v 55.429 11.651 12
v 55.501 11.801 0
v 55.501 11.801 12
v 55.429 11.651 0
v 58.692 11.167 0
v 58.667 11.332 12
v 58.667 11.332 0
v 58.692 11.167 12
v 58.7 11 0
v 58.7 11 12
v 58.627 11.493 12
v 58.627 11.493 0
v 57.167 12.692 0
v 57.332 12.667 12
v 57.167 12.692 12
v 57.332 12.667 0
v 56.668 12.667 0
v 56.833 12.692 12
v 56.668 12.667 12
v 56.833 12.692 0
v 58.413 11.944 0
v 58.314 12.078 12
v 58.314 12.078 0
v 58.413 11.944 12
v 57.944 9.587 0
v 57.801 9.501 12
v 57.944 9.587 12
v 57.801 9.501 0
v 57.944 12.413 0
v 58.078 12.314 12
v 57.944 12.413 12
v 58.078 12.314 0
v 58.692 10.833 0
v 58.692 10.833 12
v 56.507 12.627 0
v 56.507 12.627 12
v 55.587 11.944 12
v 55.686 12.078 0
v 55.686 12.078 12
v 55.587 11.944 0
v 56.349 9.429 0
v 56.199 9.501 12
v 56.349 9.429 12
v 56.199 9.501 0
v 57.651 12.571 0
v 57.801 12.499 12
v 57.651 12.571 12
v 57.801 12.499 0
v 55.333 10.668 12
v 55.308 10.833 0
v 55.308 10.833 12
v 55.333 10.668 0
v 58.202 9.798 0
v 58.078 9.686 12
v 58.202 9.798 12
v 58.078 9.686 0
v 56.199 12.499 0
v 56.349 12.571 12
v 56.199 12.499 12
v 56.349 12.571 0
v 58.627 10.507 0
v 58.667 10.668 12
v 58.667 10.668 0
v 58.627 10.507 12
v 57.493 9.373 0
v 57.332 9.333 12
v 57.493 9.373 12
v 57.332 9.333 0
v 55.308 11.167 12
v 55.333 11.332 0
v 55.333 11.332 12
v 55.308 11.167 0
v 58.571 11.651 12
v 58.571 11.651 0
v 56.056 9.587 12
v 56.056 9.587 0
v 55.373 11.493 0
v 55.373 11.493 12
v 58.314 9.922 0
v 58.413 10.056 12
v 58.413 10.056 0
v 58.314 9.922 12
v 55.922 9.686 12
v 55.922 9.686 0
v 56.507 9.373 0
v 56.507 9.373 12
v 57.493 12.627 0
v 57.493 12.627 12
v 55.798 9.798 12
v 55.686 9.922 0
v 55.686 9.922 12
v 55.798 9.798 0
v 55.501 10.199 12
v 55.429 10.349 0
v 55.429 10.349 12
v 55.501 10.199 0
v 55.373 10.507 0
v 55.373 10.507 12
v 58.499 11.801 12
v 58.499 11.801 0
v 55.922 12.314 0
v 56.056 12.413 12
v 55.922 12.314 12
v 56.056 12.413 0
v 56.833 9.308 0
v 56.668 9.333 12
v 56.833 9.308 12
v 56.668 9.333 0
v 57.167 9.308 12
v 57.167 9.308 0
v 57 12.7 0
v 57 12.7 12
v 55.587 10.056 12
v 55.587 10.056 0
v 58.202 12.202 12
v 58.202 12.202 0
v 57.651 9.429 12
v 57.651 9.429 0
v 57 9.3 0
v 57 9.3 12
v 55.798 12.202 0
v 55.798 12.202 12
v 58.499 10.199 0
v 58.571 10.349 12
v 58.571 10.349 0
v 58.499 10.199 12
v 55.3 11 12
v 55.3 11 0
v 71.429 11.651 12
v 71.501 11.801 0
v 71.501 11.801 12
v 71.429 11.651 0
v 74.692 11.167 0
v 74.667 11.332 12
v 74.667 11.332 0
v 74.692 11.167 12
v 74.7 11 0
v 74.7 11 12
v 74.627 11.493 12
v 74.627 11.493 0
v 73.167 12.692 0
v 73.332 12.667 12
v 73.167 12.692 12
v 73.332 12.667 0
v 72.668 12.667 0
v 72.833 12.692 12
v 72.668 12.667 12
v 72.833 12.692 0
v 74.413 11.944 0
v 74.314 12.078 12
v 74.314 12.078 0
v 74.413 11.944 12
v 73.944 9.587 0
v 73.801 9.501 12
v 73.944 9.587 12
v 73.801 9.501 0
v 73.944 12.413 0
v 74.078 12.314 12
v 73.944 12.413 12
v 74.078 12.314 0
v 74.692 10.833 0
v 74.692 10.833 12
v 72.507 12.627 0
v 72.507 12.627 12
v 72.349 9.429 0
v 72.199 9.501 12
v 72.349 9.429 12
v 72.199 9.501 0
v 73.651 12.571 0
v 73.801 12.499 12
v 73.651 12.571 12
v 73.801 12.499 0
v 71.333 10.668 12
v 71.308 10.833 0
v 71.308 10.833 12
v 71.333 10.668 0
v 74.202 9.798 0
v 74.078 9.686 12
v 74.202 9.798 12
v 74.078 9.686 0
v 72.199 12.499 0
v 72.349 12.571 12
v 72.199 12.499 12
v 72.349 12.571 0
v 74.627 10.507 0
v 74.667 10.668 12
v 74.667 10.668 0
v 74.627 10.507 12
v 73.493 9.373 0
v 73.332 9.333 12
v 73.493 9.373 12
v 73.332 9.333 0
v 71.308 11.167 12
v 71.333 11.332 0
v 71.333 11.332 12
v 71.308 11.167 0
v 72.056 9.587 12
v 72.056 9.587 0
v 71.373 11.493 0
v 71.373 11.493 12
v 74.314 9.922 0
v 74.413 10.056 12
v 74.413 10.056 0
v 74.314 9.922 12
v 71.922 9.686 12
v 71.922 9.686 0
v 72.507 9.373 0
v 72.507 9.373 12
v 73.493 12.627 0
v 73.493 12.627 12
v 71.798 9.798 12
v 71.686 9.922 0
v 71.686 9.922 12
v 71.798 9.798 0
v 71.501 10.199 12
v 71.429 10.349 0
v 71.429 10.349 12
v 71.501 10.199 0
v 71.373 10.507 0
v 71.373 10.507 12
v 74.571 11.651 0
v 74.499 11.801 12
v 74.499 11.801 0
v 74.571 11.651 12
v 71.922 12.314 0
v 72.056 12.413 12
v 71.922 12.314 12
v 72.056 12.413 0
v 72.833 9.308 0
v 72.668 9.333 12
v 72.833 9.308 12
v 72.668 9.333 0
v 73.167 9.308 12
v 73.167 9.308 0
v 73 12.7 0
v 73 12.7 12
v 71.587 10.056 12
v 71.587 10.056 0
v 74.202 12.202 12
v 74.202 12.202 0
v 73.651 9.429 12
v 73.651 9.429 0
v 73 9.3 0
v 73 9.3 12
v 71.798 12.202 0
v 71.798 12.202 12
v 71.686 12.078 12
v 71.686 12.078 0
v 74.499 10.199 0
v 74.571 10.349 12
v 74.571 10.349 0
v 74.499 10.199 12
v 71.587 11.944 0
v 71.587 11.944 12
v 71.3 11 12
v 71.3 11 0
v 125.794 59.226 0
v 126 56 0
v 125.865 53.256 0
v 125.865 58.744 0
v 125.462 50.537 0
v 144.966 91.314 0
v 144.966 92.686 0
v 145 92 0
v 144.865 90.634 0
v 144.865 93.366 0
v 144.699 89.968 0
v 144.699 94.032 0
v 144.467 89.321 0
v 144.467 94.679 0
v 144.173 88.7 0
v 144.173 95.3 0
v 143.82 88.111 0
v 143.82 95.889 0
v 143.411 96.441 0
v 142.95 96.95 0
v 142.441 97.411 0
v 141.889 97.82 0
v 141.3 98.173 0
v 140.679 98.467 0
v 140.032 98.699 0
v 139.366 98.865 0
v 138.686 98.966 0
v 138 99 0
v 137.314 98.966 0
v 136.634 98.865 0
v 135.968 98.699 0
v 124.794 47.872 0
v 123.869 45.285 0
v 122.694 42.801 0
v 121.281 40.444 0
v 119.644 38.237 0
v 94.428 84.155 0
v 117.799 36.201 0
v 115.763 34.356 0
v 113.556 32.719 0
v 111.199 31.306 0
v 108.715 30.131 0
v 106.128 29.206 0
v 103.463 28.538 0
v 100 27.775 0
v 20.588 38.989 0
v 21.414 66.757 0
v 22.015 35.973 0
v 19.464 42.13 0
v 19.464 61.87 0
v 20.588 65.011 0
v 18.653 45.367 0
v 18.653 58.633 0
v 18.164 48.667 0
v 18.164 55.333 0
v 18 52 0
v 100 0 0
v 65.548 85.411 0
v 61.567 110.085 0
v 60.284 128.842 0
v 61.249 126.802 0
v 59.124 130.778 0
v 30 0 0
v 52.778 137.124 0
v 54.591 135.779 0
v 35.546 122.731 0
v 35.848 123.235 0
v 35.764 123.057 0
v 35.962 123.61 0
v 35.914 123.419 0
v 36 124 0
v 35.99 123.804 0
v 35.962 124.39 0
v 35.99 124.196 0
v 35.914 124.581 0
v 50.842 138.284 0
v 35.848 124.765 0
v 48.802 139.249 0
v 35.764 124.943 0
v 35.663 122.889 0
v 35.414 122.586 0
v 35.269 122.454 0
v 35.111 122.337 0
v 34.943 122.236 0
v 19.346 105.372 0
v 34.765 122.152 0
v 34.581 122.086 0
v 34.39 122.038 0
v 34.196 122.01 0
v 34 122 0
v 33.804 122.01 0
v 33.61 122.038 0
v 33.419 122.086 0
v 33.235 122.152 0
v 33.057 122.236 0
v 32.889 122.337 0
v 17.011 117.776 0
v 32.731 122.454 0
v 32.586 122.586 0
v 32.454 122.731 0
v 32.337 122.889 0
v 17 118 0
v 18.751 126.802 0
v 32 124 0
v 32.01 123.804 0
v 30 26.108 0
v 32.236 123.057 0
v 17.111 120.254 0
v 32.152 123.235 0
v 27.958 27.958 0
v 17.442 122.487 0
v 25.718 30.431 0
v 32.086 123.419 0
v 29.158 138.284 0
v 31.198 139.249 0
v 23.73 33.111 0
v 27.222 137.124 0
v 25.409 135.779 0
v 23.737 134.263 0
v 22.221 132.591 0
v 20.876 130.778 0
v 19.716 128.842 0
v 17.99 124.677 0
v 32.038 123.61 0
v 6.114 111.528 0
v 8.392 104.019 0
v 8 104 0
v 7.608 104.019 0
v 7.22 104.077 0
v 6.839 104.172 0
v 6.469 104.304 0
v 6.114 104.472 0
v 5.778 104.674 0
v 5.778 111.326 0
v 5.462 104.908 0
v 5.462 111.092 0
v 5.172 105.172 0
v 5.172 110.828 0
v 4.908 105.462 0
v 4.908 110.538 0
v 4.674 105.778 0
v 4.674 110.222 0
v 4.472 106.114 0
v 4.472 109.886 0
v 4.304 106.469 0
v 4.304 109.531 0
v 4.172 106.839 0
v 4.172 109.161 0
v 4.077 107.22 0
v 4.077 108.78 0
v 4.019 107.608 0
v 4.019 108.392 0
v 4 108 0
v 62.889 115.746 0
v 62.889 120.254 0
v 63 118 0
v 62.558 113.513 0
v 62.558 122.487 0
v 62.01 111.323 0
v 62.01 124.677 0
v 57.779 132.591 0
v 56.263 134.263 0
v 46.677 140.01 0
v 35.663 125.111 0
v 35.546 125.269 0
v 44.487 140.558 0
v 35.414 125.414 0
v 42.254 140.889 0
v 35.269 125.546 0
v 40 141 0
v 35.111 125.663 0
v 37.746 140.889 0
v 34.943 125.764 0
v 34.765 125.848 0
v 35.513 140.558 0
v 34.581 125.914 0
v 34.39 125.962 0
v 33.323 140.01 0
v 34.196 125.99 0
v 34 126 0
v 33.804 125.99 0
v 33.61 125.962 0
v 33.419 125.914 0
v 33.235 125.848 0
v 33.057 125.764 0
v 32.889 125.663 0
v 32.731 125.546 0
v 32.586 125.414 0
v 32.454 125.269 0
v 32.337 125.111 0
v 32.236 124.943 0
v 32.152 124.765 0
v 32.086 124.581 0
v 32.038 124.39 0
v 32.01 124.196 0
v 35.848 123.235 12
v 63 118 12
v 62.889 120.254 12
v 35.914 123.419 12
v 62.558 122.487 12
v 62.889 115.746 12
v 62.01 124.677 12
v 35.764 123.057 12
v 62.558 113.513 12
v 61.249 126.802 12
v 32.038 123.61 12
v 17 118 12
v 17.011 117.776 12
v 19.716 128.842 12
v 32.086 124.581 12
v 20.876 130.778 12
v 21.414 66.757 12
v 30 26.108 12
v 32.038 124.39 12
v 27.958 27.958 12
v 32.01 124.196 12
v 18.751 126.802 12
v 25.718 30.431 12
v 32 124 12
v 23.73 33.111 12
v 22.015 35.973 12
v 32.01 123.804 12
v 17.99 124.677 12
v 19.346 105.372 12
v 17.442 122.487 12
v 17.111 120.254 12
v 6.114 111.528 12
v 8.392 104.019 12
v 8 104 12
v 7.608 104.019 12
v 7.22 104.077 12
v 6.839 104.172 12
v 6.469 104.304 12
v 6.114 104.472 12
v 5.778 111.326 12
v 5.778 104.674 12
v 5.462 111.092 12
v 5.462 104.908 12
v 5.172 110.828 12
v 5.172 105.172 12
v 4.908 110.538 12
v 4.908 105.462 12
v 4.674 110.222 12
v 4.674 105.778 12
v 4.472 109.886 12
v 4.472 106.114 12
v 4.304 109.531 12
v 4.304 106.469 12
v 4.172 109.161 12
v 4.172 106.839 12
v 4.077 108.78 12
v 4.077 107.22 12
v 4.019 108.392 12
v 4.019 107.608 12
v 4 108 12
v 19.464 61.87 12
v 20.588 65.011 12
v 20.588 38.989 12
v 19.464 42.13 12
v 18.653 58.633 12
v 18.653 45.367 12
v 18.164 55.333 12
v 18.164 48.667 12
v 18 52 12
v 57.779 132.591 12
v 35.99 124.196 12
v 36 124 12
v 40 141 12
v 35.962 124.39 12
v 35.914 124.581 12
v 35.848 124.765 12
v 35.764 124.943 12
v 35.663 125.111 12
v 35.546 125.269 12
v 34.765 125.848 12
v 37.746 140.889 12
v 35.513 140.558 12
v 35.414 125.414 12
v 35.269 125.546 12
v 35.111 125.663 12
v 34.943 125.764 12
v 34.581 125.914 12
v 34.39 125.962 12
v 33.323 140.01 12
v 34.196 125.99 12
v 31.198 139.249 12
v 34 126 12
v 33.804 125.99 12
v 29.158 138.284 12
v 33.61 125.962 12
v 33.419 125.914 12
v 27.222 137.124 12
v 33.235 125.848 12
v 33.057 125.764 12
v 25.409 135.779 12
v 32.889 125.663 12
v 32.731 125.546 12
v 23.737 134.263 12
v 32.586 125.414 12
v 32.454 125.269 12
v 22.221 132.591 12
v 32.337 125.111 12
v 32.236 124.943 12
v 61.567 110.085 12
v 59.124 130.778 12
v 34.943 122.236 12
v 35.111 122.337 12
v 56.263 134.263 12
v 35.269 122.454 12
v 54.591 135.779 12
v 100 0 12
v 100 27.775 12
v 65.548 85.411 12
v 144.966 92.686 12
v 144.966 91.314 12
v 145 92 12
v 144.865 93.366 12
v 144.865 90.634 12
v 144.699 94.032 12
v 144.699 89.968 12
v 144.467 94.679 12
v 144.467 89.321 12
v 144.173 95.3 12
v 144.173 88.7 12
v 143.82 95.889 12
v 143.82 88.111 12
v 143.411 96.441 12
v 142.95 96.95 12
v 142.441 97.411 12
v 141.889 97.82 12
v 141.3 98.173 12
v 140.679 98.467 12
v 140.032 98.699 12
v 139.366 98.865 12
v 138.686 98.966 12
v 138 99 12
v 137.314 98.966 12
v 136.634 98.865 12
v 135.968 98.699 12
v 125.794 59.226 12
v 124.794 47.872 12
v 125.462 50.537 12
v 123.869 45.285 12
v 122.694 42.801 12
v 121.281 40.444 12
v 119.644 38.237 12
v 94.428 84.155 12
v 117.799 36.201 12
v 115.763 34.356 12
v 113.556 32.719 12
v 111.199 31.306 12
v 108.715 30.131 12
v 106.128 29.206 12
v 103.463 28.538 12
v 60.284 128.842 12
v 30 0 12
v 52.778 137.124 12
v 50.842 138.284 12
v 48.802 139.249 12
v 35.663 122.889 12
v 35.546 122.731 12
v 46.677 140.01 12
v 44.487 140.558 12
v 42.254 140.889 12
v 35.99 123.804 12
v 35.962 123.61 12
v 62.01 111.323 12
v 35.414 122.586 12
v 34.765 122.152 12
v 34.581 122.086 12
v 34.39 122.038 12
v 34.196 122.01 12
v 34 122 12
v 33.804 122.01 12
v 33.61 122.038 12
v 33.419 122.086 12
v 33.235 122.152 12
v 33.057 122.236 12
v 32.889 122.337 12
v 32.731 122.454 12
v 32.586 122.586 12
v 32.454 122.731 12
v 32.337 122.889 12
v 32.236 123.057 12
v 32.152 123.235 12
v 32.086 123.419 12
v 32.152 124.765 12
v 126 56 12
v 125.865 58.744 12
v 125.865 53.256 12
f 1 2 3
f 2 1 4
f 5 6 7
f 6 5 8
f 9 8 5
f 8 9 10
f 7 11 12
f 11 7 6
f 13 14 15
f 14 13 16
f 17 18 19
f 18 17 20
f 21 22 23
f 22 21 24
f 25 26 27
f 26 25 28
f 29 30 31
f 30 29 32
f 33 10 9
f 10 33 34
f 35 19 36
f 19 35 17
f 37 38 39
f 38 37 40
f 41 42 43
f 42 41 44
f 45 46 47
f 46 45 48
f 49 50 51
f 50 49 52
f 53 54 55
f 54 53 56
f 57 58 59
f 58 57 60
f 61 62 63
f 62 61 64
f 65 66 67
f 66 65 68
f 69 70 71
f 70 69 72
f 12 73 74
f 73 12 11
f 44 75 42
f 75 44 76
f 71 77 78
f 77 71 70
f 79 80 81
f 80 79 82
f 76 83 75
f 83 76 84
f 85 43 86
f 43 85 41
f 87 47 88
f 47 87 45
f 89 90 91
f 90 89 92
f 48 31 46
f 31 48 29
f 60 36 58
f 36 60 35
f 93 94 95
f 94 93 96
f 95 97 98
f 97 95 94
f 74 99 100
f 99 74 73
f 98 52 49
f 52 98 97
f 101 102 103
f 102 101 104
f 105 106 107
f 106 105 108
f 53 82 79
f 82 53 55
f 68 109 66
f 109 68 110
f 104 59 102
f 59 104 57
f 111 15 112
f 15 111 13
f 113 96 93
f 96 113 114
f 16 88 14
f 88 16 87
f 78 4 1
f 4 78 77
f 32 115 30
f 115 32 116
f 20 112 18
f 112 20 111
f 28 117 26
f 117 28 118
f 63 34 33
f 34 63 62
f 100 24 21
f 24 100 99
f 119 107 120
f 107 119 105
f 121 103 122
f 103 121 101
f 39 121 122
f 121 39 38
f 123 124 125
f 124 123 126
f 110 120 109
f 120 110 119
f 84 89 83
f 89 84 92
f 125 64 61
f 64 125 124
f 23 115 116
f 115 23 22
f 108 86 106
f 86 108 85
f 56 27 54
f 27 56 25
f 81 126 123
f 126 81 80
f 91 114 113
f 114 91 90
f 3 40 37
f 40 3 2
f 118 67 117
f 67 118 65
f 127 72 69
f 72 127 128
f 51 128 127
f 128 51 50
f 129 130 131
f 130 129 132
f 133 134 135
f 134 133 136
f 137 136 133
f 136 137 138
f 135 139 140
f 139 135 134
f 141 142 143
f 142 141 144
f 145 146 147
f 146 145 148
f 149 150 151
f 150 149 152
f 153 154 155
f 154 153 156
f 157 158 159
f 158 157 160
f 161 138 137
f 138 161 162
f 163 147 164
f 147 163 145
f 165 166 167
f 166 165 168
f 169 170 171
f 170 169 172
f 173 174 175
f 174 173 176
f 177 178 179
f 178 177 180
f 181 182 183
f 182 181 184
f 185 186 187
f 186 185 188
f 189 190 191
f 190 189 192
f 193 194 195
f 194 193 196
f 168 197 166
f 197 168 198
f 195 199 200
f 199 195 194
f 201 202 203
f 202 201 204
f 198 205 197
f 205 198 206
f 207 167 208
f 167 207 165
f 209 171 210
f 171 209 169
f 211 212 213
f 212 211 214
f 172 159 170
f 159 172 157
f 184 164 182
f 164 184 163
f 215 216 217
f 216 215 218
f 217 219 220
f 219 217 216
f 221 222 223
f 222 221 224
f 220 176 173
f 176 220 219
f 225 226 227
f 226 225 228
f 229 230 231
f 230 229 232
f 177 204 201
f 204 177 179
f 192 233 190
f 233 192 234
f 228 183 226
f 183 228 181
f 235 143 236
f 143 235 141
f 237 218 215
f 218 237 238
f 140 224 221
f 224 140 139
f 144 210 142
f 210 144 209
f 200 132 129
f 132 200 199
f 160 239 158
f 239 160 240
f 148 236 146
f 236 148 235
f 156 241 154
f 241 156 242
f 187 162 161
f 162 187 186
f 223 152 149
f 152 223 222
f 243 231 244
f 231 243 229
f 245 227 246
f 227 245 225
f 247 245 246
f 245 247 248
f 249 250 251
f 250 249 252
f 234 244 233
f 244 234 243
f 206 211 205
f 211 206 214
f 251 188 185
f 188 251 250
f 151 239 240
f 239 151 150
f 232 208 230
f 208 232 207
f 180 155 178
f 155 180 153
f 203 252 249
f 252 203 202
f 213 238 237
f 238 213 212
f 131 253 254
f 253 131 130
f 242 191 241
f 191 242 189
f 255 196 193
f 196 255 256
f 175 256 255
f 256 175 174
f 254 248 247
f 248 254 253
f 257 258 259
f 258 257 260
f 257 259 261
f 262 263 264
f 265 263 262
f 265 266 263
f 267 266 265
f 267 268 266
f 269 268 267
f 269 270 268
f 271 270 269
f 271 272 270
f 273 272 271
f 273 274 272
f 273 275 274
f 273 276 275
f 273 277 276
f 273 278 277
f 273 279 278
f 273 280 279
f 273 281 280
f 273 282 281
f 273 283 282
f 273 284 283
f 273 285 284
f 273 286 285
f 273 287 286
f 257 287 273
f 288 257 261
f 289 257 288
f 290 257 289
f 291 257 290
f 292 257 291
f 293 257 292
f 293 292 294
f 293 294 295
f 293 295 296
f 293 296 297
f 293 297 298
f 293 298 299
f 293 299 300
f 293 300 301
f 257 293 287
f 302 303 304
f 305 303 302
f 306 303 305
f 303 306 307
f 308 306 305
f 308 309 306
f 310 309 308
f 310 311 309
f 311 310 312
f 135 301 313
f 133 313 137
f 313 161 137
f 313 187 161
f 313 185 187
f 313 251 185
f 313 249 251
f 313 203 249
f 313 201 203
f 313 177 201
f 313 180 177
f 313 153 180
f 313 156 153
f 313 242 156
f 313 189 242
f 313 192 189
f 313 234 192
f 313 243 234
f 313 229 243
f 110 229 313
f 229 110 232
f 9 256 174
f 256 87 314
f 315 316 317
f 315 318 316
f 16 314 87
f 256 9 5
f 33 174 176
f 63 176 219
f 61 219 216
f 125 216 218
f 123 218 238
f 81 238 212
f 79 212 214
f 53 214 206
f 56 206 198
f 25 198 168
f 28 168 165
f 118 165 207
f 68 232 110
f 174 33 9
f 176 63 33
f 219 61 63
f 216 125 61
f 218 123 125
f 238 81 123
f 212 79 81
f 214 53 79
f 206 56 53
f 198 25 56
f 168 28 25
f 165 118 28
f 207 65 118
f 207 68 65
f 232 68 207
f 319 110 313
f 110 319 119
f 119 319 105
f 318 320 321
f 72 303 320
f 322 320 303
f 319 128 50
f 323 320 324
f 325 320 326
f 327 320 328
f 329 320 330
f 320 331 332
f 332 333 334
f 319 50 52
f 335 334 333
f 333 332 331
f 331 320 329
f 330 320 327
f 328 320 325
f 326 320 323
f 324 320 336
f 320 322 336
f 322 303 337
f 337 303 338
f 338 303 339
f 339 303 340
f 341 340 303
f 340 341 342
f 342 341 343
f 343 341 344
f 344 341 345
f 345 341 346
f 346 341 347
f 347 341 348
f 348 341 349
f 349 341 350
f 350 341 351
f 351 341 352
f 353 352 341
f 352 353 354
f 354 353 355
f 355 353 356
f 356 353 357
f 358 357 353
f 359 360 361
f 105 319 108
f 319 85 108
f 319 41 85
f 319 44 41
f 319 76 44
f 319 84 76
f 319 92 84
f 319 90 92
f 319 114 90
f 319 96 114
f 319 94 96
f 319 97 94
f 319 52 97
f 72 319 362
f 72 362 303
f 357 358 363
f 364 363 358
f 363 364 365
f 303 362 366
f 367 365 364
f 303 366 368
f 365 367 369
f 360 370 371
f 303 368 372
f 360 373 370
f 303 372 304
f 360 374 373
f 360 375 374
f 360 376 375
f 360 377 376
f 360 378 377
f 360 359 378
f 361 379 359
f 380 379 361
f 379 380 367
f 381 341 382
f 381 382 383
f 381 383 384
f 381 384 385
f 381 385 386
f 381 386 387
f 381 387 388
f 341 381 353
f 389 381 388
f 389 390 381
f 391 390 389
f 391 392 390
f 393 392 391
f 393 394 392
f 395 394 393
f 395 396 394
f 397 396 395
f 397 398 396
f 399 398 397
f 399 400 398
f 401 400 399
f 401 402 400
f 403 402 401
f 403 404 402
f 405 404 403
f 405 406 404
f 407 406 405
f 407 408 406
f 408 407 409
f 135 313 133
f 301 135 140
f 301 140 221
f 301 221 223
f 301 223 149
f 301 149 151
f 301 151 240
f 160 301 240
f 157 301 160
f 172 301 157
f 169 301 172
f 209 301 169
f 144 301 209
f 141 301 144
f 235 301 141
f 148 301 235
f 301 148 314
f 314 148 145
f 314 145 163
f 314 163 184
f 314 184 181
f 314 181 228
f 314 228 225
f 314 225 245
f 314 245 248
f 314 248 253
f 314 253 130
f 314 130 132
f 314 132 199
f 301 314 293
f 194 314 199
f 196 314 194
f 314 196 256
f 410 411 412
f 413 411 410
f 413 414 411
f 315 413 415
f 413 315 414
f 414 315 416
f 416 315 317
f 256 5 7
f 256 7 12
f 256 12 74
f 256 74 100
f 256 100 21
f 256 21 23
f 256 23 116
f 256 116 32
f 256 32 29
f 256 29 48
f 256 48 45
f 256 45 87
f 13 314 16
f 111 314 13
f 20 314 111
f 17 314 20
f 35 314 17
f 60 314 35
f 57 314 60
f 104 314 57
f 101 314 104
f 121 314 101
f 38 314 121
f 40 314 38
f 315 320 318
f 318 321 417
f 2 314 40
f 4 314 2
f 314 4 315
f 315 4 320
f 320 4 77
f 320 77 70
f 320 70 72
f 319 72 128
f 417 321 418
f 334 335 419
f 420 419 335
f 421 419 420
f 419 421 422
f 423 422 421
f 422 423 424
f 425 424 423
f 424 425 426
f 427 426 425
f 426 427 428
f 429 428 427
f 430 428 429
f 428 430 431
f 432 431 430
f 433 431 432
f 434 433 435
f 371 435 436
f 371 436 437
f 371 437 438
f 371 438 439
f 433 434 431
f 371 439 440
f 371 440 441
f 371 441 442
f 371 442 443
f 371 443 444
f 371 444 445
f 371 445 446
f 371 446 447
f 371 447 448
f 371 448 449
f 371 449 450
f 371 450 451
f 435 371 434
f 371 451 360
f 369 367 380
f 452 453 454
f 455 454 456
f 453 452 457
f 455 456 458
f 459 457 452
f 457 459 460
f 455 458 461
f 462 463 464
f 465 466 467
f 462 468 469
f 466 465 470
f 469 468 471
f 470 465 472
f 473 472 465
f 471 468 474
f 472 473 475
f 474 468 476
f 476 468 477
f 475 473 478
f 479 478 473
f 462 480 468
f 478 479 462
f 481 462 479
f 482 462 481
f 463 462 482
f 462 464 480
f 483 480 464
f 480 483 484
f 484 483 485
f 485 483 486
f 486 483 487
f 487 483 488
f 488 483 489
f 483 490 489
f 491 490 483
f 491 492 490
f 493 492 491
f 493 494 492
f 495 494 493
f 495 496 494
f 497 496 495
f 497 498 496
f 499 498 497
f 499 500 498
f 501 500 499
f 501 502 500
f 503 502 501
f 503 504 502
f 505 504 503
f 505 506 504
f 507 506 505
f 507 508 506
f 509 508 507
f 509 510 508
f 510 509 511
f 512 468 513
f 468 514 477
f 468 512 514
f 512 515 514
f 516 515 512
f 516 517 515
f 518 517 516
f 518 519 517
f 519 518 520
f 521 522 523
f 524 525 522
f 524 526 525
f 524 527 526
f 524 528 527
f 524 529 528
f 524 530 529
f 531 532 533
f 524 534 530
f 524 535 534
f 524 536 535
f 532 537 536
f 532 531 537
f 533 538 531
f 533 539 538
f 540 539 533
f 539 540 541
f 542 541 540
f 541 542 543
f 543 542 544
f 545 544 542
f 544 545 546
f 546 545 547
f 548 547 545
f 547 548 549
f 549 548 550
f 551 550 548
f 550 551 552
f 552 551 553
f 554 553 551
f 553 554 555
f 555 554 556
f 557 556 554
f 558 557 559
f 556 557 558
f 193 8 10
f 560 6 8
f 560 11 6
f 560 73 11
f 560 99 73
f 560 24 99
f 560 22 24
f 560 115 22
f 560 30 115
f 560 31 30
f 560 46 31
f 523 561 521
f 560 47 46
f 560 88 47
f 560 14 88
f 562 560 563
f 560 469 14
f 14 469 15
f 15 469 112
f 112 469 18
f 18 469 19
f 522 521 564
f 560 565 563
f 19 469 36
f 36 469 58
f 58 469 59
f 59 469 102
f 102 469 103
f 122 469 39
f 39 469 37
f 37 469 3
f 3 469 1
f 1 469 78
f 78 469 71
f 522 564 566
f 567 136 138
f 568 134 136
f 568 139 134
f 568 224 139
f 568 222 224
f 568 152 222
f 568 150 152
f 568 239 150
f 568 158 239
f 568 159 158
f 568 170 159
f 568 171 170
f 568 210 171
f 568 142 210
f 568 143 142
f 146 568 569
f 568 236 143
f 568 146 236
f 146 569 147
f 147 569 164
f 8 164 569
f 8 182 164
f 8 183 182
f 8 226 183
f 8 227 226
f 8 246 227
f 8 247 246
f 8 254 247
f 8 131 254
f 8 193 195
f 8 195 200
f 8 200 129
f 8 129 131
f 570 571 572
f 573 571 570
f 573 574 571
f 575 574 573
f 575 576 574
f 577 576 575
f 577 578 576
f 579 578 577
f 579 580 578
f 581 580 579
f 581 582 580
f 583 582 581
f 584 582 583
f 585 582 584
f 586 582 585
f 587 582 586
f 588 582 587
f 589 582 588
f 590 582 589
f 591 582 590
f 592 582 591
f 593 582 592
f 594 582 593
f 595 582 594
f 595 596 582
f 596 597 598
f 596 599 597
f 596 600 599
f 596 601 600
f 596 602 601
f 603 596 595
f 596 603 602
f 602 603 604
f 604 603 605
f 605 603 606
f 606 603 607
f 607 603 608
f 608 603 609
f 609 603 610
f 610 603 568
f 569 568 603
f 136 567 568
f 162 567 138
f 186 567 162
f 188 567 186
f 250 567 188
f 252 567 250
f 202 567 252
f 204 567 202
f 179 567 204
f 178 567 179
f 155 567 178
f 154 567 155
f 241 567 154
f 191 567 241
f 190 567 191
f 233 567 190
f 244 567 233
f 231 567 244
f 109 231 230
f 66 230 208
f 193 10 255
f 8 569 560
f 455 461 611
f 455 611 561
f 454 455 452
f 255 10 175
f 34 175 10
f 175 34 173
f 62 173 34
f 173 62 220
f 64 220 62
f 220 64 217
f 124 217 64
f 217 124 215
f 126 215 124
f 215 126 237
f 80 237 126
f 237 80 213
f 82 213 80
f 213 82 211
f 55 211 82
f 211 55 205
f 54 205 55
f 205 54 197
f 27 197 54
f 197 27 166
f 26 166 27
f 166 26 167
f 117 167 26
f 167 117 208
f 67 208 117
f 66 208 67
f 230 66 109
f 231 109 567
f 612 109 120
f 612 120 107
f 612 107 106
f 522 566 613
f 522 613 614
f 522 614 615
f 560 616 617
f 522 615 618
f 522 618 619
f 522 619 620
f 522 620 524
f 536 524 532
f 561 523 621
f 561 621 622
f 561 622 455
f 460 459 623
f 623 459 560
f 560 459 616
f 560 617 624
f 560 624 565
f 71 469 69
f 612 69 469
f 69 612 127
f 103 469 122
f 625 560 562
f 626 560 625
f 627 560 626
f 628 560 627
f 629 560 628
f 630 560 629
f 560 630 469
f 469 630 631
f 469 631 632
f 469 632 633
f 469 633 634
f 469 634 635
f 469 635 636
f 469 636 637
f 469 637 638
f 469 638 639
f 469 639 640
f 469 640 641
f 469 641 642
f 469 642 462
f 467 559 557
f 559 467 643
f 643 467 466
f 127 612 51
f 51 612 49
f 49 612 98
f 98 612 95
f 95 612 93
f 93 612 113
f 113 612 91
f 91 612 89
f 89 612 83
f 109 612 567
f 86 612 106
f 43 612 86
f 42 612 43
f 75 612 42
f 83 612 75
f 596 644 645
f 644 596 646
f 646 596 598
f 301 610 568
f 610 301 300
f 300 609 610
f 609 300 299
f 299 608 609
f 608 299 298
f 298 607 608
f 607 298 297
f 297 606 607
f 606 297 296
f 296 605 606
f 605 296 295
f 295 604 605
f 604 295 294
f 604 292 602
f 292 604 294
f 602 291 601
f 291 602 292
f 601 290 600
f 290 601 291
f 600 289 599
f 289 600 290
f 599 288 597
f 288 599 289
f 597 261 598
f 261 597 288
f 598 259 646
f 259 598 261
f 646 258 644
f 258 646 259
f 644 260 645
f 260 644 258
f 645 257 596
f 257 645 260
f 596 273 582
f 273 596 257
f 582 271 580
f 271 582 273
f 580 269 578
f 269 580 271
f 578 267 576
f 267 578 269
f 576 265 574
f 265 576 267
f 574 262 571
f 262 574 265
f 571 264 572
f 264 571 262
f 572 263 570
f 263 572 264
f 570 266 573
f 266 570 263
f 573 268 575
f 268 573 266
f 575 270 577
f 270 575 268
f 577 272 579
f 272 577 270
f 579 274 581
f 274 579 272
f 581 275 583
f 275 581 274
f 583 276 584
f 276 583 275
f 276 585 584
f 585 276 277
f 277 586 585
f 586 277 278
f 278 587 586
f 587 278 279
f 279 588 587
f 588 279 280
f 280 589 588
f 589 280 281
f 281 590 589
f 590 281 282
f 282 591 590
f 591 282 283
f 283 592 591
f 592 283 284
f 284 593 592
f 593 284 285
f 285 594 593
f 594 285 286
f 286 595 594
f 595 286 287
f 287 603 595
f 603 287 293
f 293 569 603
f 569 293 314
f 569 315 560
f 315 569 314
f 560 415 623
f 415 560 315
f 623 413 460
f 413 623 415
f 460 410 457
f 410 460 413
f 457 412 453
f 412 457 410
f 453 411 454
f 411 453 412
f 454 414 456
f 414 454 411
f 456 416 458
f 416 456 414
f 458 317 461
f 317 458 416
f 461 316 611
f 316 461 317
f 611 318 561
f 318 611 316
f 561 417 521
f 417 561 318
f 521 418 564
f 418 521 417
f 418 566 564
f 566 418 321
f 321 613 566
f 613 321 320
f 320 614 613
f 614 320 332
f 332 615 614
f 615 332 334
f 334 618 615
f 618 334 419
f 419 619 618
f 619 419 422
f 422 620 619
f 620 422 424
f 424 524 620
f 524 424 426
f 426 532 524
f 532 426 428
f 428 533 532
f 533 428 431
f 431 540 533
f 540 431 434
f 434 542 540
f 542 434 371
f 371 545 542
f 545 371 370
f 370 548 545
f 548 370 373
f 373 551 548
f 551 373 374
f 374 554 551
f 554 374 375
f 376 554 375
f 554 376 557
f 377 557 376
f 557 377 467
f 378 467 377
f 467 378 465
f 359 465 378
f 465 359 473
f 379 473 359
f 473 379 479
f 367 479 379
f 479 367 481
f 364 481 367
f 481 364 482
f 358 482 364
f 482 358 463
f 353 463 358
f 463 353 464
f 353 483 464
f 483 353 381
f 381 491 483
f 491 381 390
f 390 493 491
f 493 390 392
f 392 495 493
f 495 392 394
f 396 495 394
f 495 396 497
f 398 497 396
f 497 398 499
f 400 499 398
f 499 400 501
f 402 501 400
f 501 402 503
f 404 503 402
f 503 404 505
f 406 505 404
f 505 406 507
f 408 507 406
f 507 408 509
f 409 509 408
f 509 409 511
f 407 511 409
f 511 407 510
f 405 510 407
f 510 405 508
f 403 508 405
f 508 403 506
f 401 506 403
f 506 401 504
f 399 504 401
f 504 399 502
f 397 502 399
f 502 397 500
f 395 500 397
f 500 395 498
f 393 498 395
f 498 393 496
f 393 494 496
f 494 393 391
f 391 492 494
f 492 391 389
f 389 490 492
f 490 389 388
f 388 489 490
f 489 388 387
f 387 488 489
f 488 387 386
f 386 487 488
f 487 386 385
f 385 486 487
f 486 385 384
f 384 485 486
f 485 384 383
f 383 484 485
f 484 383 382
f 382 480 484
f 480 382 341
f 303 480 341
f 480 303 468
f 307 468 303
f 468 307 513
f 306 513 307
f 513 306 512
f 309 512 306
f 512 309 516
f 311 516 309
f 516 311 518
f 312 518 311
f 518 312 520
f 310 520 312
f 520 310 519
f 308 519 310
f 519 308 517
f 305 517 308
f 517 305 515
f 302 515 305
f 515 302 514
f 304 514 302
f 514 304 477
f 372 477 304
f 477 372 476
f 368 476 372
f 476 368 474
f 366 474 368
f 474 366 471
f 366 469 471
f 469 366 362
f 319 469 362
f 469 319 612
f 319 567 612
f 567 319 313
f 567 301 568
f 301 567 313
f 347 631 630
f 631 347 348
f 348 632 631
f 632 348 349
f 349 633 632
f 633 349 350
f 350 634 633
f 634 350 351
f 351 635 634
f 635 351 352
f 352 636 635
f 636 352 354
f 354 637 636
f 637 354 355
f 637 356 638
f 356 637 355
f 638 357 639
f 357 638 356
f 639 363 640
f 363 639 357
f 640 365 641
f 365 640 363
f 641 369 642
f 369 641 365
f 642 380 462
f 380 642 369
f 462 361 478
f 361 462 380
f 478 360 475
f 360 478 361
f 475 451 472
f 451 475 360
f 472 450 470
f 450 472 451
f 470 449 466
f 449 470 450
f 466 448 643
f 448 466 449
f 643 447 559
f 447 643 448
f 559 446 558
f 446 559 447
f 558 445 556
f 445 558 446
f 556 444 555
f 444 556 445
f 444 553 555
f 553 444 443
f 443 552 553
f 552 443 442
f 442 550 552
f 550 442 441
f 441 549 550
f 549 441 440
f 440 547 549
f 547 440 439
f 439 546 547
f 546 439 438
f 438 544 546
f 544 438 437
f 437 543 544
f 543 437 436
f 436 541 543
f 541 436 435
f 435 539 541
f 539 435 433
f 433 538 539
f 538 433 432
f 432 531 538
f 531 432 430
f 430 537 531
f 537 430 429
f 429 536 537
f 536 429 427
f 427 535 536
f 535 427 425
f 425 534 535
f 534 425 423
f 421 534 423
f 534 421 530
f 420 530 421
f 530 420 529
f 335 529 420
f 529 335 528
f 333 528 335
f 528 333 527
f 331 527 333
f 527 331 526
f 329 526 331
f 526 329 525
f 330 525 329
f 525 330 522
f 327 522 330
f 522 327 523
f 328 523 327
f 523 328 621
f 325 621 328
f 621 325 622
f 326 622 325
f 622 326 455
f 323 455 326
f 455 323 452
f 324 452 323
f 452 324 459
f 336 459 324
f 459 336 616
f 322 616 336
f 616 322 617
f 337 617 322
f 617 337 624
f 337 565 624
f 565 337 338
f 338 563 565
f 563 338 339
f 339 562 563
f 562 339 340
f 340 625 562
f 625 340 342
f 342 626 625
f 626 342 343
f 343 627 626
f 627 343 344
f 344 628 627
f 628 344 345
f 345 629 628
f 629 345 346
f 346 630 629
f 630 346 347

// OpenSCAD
// file: params.scad
// params.scad — every shared dimension for the Duck Hunt mechanism.
// Units: millimeters. Edit here, and every part stays consistent.
//
// The one number that rules them all: rack travel per 180 degree servo
// sweep = PI * pinion pitch radius. With module 2 / 38 teeth the pitch
// radius is 38 mm -> ~119.4 mm of pop-up travel.

$fn = 64;

/* ---- Duck ---- */
duck_height = 150;      // beak-to-base silhouette height
duck_thickness = 12;    // extrusion thickness (prints flat)
duck_eye_d = 4;         // through-hole eye (0 = no eye)

/* ---- Gear train ---- */
gear_module = 2;        // tooth size; laser/print-friendly and chunky
pinion_teeth = 38;      // pitch dia = module * teeth = 76 mm
pressure_angle = 20;    // standard; rack flanks are straight at this angle
gear_thickness = 8;     // pinion face width = rack thickness
gear_backlash = 0.25;   // shaved off tooth thickness for 3D print fit

pinion_pitch_r = gear_module * pinion_teeth / 2;   // 38
pinion_tip_r = pinion_pitch_r + gear_module;       // 40
pinion_root_r = pinion_pitch_r - 1.25 * gear_module;
duck_travel = round(PI * pinion_pitch_r);          // ~119 mm per 180 deg

/* ---- Rack ---- */
rack_spine_w = 10;      // solid bar the teeth grow out of
rack_thickness = gear_thickness;
rack_tooth_h_add = gear_module;        // addendum above pitch line
rack_tooth_h_ded = 1.25 * gear_module; // dedendum below pitch line
// The rack rises UP through the lift module; the duck hangs off the
// BOTTOM of the rack on a bridge plate that passes in front of the
// channel wall. Toothed length = travel + 8 mm engagement margin each end.
rack_len = duck_travel + 16;
rack_plate_w = 30;      // duck mounting bridge at the bottom of the rack
rack_plate_h = 22;
rack_plate_t = 6;
rack_bridge_clear = 1.5; // bridge underside clearance over the channel wall
duck_mount_spacing = 16; // M3 hole pair, duck <-> rack bridge

m3_hole = 3.4;
m2_selftap_hole = 1.8;

/* ---- SG90 / MG90S micro servo (datasheet standard) ---- */
servo_body_l = 23.0;      // body length
servo_body_w = 12.4;      // body width
servo_window_clear = 0.5; // extra on the plate cutout
servo_hole_spacing = 27.8;   // mounting tab hole spacing
servo_tab_hole_d = 2.2;
servo_shaft_offset = 5.9;    // shaft axis from the near body end
// Flange contact plane -> underside of a horn pressed onto the shaft.
// MEASURE YOUR SERVO+HORN and tune; this sets how high the rack rides.
servo_face_to_horn = 9.5;

/* ---- Servo horn pocket (fits the 4-arm cross or 2-arm horn) ---- */
horn_hub_d = 8.4;         // horn hub outer dia + fit
horn_arm_w = 5.4;         // arm slot width
horn_arm_r = 17;          // arm slot length from center
horn_pocket_depth = 2.6;  // horn plate thickness + fit
horn_screw_clear_d = 5.5; // screwdriver access to the horn screw
horn_screw_r = 8;         // M2 self-tap circle into the horn arms

/* ---- Lift module (one per duck, print 6) ---- */
lm_plate_t = 4;
rack_clearance = 0.4;     // sliding fit around the rack
channel_wall_t = 4;
// Servo drops in from the front; tabs screw to the plate's front face and
// the body pokes through the plate (and the housing wall behind it).
// Rack must ride at the same height band as the pinion teeth:
lm_channel_floor_top = lm_plate_t + servo_face_to_horn;  // above plate back
// Horizontal distance, rack spine back face -> pinion axis:
lm_axis_x = rack_spine_w + rack_tooth_h_ded + pinion_pitch_r;   // 50.5
lm_x0 = -(channel_wall_t + 6);                       // plate left edge
lm_x1 = lm_axis_x + pinion_tip_r + 6;                // plate right edge
lm_plate_w = lm_x1 - lm_x0;
lm_plate_h = 110;                                    // gear dia + margin
lm_hole_inset = 5.5;      // corner mounting holes (to housing wall)
lm_hole_d = 4.4;          // M4 or #8 wood screws
lm_wall_h = lm_channel_floor_top + rack_thickness + 4.5;  // wall + lip top

/* ---- Housing (laser cut) ---- */
mat_t = 6;                // laser stock thickness (plywood/acrylic)
housing_w = 540;          // interior width (3 ducks + gaps)
housing_d = 260;          // interior depth
housing_h = 300;          // side / back wall height (rack tips rise high)
front_wall_h = 185;       // the wall ducks hide behind
mount_wall_h = 230;       // internal walls carrying the lift modules
mount_wall_d1 = 95;       // row 1 wall, distance from front (interior)
mount_wall_d2 = 195;      // row 2 wall
base_lift = 10;           // base floats this far above the wall bottoms
module_col_pitch = 170;   // duck-to-duck horizontal spacing
// Vertical position of the lift modules on the mount walls: puts the gear
// mesh high enough that the duck (hanging at the rack's bottom) rests just
// above the base and hides behind the front wall.
module_mount_y = 86;      // lift module plate bottom above mount wall bottom
wall_pilot_d = 3.2;       // pilot holes in walls for the module screws
laser_kerf = 0.15;        // per-side kerf compensation, applied to joints

/* ---- Button deck ---- */
deck_d = 160;             // deck panel depth
button_hole_d = 12;       // ADJUST to your button caps / arcade buttons
led_hole_d = 5.2;         // 5 mm RGB LED press fit
deck_row_pitch = 70;
deck_led_offset = 18;     // LED hole above its button
// main file
// duck.scad — the target: classic carnival duck silhouette, printed flat.
// part = "duck" (3D) | "outline" (2D, e.g. if you'd rather laser-cut ducks)
//
// Render:  openscad -o duck.stl duck.scad
// Print flat on its side, 2 walls, 10-15% infill — the SG90 lifting it
// only has ~470 gf at the rack, so LIGHT is the whole game.
// Bolts to the rack head with 2x M3 through the base tab.

include <params.scad>

part = "duck";

// Silhouette drawn at a nominal 150 mm height, then scaled to duck_height.
// Duck faces -X (beak left). Base tab bottom at y = 0.
module duck_outline() {
  scale(duck_height / 150) difference() {
    union() {
      hull() {  // body
        translate([52, 52]) circle(34);
        translate([98, 56]) circle(28);
      }
      hull() {  // tail kick
        translate([98, 60]) circle(24);
        translate([138, 92]) circle(7);
      }
      hull() {  // chest -> neck
        translate([46, 56]) circle(24);
        translate([40, 112]) circle(21);
      }
      translate([40, 118]) circle(23);  // head
      hull() {  // beak
        translate([32, 116]) circle(9);
        translate([8, 108]) circle(4);
      }
      translate([30, 0]) square([70, 30]);  // base tab down to the rack
    }
    if (duck_eye_d > 0) translate([34, 124]) circle(d = duck_eye_d);
  }
}

module duck() {
  s = duck_height / 150;
  difference() {
    linear_extrude(duck_thickness) duck_outline();
    // M3 pair matching the rack head (spacing stays true, never scaled)
    for (sx = [-1, 1])
      translate([65 * s + sx * duck_mount_spacing / 2, 11 * s, -0.5])
        cylinder(d = m3_hole, h = duck_thickness + 1);
  }
}

if (part == "duck") duck();
if (part == "outline") duck_outline();
